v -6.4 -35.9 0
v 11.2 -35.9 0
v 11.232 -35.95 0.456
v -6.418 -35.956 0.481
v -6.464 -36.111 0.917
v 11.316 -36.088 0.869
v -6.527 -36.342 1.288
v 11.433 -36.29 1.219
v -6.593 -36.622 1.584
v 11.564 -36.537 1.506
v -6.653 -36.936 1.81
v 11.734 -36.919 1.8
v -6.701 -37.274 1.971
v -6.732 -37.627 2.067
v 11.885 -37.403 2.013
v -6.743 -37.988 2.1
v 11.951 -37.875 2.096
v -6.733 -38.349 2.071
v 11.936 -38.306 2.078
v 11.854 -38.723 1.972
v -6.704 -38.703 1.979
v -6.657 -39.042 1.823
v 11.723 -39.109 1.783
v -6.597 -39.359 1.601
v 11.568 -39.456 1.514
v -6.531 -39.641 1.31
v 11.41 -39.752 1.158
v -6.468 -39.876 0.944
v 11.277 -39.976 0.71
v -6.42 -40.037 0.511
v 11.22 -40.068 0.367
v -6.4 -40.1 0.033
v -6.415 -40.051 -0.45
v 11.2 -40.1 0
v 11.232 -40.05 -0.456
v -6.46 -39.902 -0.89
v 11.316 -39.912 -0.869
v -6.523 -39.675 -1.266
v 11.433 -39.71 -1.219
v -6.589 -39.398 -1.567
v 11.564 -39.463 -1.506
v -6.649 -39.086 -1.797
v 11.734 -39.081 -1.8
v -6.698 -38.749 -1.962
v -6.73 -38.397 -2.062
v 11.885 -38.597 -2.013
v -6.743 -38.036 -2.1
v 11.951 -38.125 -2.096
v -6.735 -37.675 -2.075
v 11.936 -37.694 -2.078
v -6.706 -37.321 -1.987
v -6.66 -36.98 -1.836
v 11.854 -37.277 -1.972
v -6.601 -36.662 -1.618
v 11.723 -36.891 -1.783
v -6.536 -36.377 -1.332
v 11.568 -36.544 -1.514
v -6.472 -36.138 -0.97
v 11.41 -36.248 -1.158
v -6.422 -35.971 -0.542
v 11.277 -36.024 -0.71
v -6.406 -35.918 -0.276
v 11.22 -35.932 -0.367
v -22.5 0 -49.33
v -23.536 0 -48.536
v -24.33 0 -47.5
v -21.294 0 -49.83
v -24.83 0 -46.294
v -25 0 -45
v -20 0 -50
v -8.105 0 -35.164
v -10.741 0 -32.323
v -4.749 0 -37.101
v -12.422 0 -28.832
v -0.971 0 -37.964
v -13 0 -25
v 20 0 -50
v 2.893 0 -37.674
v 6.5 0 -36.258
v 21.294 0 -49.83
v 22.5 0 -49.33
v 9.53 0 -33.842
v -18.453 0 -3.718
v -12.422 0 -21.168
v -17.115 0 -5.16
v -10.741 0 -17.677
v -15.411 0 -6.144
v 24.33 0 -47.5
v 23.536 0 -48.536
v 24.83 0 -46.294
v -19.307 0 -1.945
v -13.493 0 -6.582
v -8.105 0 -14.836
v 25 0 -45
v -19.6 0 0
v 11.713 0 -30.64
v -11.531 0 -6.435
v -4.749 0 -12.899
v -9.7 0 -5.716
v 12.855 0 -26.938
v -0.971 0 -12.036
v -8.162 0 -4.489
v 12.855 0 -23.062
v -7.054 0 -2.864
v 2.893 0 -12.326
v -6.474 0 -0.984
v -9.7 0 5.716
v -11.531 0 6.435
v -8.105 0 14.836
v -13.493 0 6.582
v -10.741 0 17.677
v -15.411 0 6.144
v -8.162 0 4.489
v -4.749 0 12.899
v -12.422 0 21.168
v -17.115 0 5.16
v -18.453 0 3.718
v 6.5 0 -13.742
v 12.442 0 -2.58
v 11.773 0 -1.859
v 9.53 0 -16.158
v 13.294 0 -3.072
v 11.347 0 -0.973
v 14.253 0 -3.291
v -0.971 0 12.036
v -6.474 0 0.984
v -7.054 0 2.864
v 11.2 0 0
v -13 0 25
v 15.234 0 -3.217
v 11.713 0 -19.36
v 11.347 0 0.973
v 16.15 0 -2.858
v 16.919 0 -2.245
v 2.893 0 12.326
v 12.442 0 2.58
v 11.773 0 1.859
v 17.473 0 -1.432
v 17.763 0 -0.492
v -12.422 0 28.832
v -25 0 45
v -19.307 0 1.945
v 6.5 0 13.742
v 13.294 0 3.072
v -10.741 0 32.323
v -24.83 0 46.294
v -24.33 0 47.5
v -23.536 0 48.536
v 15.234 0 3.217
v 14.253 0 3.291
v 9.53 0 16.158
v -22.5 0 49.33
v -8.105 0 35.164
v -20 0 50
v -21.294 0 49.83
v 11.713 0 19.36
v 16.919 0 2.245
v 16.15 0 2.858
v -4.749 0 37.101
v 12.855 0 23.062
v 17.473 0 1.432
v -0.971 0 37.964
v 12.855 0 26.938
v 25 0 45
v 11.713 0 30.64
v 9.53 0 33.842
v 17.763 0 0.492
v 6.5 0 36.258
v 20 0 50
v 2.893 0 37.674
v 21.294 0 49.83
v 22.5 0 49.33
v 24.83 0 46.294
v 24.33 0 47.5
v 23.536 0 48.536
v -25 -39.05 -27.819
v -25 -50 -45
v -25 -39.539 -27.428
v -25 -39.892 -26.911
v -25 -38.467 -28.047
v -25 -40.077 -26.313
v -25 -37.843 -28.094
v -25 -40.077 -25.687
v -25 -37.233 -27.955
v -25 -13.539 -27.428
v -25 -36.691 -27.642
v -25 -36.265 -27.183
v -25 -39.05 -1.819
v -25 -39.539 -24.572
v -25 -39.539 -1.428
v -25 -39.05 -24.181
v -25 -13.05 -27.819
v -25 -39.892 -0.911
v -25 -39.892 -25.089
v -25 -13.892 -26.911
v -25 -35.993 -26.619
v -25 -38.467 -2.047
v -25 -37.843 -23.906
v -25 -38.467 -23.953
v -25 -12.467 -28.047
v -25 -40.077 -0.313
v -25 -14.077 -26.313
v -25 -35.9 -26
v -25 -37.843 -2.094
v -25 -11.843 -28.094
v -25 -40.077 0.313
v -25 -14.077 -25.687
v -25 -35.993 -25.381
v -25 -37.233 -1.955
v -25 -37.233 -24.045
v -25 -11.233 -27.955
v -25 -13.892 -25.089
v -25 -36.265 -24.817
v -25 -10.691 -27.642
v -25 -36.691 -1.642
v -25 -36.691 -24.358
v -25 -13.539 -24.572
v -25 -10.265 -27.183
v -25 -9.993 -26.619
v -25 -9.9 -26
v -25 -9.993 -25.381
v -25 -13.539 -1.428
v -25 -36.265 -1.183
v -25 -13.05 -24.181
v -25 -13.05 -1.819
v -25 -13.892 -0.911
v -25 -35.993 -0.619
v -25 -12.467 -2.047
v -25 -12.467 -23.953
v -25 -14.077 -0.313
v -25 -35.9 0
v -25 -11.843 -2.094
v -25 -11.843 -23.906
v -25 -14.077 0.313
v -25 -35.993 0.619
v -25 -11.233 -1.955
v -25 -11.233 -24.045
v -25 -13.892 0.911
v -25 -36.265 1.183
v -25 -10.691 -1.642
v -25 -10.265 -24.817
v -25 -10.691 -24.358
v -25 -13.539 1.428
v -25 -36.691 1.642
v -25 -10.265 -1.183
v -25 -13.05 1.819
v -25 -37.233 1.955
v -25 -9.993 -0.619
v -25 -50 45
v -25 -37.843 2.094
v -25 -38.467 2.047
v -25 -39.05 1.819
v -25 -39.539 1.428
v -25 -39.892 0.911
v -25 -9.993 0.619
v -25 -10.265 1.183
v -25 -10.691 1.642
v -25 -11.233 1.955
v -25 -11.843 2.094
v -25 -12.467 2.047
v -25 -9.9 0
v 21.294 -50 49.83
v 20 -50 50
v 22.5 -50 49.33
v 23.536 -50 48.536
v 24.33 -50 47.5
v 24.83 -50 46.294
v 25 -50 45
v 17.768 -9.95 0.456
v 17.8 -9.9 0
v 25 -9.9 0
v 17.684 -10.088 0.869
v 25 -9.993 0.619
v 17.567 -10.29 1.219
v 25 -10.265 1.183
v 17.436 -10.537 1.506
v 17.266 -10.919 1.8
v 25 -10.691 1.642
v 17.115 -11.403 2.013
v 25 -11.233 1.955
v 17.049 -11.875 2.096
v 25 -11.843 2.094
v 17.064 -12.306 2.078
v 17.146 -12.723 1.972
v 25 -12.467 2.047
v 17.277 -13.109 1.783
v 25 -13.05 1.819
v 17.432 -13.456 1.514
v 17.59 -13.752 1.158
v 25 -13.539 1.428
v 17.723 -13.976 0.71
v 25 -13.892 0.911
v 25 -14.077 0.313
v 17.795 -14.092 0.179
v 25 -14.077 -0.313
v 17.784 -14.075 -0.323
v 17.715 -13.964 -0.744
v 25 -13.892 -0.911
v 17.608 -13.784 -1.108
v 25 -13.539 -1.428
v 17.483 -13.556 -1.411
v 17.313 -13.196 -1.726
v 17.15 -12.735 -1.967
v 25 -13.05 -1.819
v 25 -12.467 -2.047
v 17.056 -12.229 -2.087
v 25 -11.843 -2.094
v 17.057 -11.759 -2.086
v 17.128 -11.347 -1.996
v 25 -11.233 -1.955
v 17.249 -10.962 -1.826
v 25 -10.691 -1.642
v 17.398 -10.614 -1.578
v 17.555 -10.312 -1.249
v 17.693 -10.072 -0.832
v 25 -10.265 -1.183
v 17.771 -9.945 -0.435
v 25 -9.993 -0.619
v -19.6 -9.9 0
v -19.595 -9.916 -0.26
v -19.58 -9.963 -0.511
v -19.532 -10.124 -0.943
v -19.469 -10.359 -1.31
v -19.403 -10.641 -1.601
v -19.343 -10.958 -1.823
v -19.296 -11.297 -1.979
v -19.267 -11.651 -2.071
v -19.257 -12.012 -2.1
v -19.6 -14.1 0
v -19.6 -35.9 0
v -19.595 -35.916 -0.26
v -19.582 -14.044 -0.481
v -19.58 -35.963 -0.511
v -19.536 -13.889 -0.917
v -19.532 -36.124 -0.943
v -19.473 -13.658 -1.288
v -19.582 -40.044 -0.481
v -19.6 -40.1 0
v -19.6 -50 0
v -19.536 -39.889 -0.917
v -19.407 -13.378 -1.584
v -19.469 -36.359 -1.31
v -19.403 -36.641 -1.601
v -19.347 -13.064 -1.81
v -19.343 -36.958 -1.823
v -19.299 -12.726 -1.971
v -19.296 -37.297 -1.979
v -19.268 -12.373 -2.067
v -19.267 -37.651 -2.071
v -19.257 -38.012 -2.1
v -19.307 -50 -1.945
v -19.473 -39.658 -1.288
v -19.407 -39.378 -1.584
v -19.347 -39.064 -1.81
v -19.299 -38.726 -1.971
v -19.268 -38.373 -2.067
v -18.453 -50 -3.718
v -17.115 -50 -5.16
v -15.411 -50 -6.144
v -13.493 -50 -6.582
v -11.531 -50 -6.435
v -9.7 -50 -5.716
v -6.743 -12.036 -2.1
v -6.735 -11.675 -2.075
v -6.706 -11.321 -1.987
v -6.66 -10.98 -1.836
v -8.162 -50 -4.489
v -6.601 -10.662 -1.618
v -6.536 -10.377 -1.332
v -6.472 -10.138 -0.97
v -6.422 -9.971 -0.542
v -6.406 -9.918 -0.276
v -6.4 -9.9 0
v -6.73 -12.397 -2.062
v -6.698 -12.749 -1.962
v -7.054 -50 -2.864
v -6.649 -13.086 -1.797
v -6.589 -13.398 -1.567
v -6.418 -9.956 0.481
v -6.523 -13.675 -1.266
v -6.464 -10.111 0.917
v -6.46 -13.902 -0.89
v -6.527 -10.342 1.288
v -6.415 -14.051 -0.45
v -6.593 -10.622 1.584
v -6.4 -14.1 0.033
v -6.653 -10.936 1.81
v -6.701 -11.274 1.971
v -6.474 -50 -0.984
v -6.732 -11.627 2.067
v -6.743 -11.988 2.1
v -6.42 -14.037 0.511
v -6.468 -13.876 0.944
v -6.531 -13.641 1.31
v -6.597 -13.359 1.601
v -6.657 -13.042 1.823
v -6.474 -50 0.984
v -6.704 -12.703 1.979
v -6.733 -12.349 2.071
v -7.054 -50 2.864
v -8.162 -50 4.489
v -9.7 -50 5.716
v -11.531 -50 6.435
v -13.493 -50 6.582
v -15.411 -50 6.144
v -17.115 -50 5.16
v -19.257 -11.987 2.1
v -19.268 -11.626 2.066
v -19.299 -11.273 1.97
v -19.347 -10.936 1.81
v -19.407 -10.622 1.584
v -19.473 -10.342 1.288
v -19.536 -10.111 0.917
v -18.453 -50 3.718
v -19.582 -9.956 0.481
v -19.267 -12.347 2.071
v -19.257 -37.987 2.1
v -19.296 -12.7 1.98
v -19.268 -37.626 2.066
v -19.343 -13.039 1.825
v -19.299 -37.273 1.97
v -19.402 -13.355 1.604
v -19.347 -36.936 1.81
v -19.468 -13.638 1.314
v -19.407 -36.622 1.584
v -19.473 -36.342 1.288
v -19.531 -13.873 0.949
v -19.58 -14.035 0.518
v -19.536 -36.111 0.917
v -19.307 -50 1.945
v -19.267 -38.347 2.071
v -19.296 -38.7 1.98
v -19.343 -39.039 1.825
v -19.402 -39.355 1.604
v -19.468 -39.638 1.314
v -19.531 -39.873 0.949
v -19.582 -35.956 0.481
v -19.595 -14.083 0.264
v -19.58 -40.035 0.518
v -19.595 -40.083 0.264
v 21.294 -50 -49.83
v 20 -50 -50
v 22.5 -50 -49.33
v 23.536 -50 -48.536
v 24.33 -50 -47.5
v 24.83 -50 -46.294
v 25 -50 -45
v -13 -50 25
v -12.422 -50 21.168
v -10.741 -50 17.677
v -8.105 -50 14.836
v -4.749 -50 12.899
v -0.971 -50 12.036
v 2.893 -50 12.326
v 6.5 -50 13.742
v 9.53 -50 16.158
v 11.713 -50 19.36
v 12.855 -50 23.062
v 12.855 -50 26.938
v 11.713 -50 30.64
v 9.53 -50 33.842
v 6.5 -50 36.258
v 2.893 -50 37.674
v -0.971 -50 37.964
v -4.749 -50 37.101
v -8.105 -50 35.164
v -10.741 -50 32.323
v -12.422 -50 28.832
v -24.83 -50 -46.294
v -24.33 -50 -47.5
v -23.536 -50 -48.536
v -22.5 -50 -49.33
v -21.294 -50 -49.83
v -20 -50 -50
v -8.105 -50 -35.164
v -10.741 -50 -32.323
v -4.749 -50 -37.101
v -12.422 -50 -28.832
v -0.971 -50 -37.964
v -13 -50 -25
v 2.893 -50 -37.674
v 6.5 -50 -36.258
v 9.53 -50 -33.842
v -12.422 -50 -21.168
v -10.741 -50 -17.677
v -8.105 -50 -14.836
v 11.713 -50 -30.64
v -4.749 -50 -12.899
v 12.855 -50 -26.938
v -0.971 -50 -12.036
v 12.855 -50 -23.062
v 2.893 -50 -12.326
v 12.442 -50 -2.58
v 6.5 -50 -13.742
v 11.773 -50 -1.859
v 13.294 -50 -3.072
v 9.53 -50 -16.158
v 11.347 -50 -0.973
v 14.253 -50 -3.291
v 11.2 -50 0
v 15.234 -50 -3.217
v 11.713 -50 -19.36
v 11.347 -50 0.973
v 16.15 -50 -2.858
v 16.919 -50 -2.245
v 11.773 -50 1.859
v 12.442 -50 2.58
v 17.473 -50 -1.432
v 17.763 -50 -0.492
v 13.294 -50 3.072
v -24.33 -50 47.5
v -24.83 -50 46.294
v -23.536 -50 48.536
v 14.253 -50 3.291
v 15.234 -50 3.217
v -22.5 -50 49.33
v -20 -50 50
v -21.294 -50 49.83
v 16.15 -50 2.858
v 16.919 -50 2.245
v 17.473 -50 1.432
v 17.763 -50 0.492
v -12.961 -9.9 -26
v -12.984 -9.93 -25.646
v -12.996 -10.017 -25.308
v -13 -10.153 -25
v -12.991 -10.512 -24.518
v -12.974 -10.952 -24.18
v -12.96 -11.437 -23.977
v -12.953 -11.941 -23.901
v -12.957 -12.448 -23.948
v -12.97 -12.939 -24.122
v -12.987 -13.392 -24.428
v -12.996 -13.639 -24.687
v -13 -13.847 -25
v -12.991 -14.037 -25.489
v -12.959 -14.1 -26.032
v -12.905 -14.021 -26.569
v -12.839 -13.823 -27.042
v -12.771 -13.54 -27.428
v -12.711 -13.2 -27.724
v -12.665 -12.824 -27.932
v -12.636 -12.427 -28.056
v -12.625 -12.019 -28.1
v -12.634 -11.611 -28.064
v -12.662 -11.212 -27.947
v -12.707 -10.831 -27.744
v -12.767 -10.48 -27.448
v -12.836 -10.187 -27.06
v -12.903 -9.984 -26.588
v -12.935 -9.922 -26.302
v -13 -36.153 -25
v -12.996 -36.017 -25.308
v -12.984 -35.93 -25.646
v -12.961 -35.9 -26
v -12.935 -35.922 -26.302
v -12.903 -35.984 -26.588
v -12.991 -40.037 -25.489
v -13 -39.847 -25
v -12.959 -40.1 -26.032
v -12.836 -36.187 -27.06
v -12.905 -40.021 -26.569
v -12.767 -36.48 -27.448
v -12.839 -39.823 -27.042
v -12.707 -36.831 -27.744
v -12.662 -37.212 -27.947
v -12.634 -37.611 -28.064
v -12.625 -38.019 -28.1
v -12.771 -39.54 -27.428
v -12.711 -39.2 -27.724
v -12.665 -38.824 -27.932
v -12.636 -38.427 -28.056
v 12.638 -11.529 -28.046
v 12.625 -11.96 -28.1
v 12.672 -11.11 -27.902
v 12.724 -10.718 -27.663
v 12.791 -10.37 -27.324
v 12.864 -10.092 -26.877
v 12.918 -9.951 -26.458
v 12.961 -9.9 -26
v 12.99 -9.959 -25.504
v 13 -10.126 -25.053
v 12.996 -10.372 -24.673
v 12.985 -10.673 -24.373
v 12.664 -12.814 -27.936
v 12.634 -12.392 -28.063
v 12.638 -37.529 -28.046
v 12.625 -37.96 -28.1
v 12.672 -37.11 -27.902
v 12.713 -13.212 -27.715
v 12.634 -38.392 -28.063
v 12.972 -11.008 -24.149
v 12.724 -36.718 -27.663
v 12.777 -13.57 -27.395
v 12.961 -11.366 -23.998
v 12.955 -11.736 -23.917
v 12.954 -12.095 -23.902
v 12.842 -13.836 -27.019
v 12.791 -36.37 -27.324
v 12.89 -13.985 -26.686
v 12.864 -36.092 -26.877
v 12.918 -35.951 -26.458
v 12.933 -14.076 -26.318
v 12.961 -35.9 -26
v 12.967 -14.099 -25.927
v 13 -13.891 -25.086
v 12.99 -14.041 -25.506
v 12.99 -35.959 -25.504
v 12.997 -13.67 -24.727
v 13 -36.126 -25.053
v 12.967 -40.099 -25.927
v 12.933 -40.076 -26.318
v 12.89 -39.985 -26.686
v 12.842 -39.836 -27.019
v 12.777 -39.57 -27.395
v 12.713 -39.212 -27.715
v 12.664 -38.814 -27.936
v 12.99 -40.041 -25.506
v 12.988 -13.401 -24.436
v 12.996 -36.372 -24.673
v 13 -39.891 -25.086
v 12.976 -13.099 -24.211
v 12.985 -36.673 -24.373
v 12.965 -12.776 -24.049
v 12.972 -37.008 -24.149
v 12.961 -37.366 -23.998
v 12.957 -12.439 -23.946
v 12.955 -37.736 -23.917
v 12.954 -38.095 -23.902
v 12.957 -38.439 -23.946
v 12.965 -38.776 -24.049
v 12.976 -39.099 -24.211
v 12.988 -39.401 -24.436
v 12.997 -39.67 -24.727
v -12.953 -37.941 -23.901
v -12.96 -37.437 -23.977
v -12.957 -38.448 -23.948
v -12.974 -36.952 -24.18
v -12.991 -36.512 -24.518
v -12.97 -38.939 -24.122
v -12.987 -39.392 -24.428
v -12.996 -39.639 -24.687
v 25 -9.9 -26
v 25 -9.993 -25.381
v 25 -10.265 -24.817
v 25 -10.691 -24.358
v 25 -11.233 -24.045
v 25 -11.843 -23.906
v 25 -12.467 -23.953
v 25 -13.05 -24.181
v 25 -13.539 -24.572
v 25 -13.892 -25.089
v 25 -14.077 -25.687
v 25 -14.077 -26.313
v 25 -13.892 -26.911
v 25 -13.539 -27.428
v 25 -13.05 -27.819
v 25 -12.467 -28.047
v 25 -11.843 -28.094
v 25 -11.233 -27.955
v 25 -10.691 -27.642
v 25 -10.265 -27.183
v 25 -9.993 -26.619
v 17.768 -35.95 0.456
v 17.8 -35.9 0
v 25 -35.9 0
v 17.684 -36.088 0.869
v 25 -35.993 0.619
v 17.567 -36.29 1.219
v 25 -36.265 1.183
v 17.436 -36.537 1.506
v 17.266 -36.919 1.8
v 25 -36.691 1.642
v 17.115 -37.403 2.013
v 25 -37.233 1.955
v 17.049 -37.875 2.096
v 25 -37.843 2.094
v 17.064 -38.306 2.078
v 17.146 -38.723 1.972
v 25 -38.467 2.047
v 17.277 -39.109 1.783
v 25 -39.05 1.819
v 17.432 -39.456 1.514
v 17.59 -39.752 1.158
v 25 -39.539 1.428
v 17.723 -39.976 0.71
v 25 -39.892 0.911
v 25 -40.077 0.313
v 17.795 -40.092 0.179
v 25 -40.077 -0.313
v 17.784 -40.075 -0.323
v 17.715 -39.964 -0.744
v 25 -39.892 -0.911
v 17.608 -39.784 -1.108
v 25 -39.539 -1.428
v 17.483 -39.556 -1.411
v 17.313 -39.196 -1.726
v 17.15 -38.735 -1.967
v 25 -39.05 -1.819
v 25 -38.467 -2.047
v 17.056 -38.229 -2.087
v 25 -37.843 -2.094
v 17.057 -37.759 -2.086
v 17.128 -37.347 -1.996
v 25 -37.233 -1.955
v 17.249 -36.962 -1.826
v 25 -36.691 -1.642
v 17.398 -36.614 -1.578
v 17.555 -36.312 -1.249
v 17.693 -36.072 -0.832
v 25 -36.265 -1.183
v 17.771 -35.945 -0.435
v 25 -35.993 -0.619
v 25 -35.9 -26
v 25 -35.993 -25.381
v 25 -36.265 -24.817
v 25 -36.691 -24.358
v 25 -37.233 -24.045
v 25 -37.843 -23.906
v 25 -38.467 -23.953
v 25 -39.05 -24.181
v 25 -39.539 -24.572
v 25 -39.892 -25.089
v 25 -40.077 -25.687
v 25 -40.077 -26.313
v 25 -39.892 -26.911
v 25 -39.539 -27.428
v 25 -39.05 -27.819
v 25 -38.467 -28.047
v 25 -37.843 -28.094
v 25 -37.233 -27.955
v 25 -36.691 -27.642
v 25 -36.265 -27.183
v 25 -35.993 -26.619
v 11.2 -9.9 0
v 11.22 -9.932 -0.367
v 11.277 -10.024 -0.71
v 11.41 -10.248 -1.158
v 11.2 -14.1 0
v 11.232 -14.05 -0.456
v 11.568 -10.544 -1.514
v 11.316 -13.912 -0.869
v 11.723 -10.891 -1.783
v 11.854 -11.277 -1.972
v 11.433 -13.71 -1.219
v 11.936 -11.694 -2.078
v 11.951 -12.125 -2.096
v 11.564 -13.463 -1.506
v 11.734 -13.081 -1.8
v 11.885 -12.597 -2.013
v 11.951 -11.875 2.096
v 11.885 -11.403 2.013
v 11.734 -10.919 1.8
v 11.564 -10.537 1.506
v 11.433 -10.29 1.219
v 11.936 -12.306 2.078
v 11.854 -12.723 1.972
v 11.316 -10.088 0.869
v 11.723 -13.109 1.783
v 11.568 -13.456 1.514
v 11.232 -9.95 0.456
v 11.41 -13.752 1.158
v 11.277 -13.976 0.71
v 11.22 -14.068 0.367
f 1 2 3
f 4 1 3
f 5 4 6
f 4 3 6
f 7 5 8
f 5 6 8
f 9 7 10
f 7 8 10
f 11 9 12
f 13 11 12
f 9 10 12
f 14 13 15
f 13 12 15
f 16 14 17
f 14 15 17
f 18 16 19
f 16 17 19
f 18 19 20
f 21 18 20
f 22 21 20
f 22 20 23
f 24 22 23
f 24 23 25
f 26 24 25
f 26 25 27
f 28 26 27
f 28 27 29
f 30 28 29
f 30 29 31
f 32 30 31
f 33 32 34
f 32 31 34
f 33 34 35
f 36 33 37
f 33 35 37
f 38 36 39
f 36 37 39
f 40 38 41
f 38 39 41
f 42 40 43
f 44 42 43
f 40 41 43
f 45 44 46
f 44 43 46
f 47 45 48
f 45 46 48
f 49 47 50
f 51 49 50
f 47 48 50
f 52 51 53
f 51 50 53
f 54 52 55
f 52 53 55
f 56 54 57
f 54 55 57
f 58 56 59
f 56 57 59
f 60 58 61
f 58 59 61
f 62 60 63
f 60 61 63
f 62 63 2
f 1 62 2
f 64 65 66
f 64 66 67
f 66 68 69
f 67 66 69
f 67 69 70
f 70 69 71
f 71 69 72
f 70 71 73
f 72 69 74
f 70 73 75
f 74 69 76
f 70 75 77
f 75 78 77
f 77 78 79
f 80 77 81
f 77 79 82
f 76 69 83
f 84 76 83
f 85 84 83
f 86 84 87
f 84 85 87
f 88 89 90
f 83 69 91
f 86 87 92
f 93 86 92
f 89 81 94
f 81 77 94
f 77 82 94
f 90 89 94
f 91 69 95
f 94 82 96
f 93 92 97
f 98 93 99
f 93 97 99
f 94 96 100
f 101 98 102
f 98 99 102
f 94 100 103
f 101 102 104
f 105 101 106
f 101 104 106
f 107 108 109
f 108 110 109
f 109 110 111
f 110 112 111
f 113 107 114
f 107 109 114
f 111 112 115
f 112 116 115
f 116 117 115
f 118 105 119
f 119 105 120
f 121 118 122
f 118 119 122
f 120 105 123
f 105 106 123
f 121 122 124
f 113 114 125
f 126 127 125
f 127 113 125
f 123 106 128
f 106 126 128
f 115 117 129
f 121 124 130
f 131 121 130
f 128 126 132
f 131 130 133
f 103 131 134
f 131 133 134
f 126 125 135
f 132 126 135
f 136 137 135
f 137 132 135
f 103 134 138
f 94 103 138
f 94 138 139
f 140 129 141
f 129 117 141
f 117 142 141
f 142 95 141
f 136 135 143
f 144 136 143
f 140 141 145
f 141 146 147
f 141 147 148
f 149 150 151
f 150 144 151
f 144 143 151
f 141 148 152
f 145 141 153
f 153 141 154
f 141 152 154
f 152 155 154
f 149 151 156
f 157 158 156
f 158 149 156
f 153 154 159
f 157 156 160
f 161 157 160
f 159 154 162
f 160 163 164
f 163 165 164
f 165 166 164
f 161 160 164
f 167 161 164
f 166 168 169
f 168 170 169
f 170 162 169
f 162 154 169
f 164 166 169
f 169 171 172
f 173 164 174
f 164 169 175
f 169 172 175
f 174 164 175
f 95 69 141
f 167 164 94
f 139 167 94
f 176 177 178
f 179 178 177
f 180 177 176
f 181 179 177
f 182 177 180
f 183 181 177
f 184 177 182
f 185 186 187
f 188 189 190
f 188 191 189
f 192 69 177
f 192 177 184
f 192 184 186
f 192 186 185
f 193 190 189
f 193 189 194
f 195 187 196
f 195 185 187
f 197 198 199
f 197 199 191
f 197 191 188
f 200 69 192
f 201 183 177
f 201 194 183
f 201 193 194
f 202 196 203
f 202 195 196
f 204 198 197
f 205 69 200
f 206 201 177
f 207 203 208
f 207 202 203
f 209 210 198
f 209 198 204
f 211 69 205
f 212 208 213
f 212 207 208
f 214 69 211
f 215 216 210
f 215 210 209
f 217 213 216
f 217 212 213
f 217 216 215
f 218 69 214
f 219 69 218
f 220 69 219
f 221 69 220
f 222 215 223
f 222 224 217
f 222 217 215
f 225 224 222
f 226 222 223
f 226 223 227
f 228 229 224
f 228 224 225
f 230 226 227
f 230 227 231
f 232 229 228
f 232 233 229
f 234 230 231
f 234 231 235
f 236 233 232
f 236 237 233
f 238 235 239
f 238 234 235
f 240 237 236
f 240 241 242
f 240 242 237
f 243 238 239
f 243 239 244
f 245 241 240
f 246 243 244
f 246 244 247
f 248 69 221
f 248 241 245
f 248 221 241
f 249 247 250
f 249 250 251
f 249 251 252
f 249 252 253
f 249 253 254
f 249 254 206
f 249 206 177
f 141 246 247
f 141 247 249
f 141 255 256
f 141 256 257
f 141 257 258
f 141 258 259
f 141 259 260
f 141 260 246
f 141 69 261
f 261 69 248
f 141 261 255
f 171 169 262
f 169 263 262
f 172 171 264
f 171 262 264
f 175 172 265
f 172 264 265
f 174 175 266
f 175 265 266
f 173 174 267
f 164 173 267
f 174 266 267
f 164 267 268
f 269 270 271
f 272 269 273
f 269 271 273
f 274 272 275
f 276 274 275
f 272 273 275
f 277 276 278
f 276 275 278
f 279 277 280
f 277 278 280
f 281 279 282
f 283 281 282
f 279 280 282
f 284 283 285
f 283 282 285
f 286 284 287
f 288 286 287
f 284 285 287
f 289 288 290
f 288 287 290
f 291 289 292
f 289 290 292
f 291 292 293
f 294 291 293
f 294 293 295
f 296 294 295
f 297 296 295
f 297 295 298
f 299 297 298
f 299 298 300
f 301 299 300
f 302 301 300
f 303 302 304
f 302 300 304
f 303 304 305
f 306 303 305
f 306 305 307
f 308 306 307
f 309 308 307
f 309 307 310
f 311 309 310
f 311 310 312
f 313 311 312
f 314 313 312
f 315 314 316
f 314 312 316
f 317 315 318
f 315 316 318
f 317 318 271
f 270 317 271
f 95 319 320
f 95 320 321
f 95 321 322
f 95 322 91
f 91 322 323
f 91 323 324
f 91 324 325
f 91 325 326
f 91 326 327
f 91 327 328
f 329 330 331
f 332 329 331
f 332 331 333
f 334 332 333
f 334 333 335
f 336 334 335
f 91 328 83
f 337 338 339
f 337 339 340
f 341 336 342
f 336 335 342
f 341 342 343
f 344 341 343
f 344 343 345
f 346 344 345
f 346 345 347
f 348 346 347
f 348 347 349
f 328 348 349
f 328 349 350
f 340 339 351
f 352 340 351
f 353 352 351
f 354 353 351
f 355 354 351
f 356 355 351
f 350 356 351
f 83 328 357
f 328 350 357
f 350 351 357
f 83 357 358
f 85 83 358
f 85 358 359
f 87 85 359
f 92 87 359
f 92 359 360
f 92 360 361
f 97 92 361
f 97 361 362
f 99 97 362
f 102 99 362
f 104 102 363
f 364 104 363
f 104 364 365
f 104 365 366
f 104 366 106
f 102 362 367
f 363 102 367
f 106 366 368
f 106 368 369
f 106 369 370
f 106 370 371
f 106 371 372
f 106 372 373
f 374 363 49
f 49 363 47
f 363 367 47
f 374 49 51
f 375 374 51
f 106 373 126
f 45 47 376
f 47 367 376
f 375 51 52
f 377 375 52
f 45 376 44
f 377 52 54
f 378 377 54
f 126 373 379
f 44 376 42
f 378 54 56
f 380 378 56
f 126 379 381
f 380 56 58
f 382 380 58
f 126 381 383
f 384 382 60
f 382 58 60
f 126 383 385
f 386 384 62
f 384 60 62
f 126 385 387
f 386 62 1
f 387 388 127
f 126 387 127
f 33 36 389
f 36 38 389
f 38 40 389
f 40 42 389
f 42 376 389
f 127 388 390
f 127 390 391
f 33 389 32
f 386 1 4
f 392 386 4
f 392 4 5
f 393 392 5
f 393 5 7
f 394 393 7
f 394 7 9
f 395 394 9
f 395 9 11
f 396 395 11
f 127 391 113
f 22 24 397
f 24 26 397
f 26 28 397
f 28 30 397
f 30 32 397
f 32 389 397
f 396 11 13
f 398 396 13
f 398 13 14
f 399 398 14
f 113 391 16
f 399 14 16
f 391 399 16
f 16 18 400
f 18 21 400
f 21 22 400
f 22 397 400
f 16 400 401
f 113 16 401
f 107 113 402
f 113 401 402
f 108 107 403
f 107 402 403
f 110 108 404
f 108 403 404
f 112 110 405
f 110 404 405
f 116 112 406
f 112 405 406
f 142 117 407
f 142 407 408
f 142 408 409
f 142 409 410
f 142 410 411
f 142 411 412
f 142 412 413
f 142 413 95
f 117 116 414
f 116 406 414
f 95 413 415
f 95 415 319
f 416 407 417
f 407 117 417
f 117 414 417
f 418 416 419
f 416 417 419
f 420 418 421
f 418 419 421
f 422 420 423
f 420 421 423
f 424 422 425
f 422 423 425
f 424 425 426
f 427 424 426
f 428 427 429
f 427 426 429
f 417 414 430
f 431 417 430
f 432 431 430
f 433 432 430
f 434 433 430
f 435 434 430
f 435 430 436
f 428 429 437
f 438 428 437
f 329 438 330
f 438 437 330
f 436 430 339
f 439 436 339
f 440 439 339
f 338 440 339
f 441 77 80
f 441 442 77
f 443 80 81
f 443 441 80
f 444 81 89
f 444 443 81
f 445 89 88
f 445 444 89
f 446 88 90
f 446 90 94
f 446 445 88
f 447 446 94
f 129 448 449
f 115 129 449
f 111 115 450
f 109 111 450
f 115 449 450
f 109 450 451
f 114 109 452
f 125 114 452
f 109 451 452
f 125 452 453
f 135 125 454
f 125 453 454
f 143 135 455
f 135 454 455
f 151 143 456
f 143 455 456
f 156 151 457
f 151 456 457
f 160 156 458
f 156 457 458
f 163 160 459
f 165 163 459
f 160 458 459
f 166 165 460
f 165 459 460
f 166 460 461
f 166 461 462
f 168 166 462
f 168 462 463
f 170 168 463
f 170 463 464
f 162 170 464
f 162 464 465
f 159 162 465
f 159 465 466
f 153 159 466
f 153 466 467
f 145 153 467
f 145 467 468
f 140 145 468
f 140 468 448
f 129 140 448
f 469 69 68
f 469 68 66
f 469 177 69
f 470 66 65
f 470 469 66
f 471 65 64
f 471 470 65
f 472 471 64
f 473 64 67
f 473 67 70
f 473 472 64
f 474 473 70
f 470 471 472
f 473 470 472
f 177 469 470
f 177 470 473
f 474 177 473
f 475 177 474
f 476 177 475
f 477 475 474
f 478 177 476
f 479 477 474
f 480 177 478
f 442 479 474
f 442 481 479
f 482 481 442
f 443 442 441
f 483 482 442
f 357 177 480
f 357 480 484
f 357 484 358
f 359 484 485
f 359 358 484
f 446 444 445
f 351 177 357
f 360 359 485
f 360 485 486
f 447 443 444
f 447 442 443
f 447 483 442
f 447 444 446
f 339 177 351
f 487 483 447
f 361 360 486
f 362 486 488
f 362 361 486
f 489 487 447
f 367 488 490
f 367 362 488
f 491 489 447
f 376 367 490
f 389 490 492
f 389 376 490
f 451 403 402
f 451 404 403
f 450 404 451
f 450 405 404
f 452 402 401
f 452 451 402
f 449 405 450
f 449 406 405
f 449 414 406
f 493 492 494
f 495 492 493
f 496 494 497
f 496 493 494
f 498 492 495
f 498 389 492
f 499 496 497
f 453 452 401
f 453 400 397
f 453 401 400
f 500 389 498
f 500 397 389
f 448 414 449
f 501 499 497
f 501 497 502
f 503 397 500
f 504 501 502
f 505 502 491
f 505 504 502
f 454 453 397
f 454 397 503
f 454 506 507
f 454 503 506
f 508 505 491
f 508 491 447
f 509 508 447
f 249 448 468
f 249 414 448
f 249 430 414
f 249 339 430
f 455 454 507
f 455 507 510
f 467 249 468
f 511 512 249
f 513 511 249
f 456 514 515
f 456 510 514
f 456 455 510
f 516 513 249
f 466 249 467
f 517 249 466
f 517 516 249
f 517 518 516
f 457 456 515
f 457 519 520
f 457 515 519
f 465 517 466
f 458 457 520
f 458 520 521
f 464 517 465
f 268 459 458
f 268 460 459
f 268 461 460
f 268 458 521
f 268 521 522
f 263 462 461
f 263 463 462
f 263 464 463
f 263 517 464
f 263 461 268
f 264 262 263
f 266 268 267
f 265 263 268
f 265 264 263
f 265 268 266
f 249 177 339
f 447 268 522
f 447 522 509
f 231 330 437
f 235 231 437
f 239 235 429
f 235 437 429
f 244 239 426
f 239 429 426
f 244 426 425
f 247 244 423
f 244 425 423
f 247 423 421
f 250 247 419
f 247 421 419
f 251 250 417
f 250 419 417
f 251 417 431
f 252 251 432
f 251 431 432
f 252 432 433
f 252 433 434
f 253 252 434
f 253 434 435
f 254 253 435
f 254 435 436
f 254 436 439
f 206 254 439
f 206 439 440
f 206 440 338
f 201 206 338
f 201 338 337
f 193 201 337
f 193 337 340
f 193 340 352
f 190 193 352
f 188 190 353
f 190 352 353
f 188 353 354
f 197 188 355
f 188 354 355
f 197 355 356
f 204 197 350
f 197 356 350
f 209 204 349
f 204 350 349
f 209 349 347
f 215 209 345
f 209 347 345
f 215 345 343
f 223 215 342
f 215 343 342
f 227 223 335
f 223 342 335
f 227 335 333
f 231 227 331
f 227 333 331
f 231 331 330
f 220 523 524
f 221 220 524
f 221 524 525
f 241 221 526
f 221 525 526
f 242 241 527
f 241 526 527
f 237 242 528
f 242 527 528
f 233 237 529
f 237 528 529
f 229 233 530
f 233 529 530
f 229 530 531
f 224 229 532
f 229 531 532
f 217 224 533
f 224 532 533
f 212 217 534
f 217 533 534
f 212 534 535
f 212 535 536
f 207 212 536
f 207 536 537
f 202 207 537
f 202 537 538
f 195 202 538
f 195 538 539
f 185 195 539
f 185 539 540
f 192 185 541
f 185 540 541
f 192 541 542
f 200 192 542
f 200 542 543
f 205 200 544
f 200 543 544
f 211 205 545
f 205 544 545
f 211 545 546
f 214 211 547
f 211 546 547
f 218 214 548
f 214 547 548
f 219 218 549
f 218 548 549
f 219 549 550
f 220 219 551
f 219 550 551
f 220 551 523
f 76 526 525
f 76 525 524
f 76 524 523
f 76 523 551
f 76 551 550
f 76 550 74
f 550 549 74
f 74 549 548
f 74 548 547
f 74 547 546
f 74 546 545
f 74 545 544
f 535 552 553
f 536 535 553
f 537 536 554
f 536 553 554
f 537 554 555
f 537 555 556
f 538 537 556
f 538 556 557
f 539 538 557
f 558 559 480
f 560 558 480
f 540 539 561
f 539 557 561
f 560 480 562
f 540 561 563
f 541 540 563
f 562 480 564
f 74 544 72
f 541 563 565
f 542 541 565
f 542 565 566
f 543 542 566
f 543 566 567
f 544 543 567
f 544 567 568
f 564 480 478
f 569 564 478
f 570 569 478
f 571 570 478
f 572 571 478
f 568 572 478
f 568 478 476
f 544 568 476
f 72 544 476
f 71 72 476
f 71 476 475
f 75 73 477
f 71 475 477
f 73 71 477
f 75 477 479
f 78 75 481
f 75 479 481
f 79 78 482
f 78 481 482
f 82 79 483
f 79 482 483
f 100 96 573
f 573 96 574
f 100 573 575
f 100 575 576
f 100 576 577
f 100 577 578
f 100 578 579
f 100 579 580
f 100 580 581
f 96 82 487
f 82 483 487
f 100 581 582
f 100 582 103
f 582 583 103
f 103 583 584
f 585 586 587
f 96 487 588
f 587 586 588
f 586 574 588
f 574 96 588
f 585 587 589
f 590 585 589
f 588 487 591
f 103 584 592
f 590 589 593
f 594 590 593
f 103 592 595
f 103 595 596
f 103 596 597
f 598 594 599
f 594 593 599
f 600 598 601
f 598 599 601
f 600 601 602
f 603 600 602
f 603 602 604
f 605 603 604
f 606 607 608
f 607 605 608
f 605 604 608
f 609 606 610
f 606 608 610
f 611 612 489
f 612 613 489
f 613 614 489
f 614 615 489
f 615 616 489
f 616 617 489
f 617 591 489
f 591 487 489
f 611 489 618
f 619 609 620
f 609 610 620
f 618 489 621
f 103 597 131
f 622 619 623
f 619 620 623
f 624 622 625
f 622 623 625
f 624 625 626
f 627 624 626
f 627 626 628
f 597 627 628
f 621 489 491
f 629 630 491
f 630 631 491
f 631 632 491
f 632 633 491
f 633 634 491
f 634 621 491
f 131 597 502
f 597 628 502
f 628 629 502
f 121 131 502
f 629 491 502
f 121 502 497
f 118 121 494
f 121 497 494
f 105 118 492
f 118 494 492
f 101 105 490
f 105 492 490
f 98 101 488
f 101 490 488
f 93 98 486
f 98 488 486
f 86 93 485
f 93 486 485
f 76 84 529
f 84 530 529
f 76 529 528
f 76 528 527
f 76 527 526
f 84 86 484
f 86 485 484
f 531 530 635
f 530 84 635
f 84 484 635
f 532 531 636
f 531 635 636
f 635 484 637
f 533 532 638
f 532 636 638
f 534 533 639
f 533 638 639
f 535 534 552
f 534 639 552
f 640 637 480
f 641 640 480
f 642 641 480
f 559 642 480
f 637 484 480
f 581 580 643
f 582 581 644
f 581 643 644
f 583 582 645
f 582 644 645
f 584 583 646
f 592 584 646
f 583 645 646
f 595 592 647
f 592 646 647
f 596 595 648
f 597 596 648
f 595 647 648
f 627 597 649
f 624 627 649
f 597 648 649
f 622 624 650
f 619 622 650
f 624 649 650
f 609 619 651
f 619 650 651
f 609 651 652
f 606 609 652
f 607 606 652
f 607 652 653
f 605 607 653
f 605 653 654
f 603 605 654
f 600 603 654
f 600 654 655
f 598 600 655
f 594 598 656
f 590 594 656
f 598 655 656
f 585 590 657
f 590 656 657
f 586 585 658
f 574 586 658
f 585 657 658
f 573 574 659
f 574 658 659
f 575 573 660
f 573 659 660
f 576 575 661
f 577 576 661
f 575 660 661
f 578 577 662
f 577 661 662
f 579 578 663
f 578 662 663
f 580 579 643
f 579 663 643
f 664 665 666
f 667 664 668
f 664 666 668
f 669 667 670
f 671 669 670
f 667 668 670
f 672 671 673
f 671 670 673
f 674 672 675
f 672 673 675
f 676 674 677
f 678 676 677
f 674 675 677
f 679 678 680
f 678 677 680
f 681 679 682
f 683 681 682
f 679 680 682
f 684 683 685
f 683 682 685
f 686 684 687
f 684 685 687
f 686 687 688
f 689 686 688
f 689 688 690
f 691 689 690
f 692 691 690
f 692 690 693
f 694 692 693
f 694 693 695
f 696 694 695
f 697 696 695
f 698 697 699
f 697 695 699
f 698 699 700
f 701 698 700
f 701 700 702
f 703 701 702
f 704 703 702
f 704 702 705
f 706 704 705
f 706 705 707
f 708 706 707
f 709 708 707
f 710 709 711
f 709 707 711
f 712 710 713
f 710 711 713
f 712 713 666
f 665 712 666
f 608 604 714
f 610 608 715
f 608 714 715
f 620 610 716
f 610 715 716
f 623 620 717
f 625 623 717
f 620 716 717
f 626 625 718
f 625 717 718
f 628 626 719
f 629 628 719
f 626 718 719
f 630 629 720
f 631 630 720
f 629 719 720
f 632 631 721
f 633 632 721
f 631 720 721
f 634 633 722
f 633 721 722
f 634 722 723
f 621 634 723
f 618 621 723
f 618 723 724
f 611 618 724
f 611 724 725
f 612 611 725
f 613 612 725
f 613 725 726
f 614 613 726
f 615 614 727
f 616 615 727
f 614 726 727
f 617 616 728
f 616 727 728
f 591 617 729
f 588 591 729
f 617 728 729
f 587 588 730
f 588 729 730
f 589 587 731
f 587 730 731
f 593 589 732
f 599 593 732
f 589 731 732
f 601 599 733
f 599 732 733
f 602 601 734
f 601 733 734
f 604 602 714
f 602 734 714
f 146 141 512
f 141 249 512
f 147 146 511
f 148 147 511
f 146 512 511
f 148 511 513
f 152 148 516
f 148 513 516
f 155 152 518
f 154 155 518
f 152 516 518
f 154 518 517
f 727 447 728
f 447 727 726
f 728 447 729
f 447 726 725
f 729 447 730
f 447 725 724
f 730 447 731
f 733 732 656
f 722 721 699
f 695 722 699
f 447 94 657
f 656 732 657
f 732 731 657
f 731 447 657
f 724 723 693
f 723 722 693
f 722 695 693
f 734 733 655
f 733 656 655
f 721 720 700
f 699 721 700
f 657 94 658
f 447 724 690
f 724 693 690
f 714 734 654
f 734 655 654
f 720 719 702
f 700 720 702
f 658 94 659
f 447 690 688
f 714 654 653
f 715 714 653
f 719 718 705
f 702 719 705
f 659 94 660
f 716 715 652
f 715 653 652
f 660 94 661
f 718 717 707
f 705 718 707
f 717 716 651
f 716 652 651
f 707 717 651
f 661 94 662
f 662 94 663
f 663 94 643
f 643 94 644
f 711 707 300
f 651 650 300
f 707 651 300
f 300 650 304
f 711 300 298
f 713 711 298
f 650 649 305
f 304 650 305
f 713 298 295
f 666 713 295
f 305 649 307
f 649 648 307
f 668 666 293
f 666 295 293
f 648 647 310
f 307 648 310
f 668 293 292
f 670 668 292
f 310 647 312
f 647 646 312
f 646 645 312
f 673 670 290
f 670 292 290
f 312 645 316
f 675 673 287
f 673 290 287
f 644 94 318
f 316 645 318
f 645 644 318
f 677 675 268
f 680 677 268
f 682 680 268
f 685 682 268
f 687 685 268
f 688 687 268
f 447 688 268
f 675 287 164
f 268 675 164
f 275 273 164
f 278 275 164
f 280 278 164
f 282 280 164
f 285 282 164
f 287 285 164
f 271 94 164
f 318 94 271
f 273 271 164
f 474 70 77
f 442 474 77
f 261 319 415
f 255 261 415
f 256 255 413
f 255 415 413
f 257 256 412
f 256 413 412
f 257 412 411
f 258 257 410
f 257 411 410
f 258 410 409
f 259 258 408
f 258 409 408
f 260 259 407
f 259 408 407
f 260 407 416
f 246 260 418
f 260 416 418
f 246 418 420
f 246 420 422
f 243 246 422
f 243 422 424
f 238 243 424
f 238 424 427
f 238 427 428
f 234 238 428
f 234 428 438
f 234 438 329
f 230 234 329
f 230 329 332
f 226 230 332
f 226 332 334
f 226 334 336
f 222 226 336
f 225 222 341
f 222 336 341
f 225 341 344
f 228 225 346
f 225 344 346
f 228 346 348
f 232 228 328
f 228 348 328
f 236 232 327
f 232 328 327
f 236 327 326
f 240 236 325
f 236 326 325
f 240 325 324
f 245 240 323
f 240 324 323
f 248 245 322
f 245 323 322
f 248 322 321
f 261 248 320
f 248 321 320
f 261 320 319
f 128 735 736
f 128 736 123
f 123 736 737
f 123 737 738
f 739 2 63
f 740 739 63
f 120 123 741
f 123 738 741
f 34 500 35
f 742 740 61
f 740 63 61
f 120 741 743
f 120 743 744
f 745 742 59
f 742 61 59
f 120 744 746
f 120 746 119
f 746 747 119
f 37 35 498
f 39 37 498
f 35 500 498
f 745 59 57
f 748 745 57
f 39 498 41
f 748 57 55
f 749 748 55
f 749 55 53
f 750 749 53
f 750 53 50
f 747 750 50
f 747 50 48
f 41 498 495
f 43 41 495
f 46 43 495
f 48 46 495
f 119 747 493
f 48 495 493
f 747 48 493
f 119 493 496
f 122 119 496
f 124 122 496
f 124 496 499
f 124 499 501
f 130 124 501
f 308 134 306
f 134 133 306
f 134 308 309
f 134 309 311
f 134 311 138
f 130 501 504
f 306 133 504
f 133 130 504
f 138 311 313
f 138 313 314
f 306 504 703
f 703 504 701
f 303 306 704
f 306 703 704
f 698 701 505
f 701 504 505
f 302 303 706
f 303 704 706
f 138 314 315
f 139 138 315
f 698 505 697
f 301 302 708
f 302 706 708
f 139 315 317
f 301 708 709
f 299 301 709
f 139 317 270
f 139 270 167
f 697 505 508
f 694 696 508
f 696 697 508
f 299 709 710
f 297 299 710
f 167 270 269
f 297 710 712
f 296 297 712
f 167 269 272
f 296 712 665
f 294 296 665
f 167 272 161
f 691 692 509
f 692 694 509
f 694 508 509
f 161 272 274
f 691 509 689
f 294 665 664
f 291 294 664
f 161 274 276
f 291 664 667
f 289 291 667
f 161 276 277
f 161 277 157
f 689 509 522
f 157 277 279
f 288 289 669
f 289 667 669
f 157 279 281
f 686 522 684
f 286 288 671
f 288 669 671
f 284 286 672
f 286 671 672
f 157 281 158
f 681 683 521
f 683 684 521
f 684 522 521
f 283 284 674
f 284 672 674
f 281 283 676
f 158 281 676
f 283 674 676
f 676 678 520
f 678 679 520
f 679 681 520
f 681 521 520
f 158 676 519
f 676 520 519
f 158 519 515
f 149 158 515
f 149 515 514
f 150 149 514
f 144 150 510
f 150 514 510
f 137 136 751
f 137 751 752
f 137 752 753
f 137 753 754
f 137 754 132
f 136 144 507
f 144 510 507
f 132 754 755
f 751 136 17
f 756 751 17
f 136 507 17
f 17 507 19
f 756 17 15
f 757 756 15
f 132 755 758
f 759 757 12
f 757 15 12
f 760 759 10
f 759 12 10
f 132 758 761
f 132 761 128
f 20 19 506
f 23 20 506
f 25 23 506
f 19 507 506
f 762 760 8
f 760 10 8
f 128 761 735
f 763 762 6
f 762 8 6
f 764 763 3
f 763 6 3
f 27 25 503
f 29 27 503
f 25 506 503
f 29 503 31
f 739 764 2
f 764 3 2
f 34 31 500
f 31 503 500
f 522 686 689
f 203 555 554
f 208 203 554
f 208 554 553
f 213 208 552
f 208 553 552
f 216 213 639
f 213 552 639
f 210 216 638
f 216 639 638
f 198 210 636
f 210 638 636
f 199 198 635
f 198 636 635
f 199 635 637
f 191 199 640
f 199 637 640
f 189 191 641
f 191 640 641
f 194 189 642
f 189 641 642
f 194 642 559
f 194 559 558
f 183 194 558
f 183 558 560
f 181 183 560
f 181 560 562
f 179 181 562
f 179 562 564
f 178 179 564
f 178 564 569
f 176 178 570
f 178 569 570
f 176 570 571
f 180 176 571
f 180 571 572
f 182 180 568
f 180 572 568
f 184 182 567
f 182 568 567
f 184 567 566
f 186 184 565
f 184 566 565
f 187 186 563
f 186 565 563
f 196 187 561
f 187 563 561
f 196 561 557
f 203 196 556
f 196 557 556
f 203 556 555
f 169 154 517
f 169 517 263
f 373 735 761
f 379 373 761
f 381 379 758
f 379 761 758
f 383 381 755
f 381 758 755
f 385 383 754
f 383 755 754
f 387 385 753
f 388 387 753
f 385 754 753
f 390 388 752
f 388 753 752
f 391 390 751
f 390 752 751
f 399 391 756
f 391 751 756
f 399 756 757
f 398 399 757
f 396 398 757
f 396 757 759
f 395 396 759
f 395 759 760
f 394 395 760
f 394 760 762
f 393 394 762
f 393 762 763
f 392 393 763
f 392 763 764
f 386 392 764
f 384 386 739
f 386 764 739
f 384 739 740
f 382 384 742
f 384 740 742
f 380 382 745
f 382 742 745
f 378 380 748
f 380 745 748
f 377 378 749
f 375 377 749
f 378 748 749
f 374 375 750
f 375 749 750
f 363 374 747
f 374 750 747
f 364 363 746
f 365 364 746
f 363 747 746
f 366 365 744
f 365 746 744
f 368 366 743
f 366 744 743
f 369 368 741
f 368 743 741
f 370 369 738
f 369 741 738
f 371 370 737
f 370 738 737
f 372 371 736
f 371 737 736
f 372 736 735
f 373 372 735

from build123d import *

# Parameters (mm, degrees)
F0_W     = 50
F0_H     = 100
F1_DEPTH = 50
F2_D     = 26
F3_D     = 6.6
F4_D     = 13.2
F5_R     = 5
F7_D     = 4.2
F7_DEPTH = 52.4
F7_TIP   = 1.2618073
F8_D     = 4.2
F8_DEPTH = 50
F8_TIP   = 1.2618073


with BuildPart() as f1:
    # F0 (on Front) → F1 (new body)
    with BuildSketch(Plane.XZ):
        Rectangle(F0_W, F0_H)
    extrude(amount=F1_DEPTH)

    # F2 (through all)
    with Locations(Plane(origin=(0, 0, 0), x_dir=(1, 0, 0), z_dir=(0, 1, 0))):
        with Locations((0, -25), (0, 25)):
            Hole(F2_D / 2)

    # F3 (through all)
    with Locations(Plane(origin=(0, 0, 0), x_dir=(1, 0, 0), z_dir=(0, 1, 0))):
        with Locations((14.5, 0)):
            Hole(F3_D / 2)

    # F4 (through all)
    with Locations(Plane(origin=(0, 0, 0), x_dir=(1, 0, 0), z_dir=(0, 1, 0))):
        with Locations((-13, 0)):
            Hole(F4_D / 2)

    # F5
    f5_edges = [f1.edges().sort_by_distance(p)[0] for p in [
        (-25, -25, 50),
        (25, -25, 50),
        (25, -25, -50),
        (-25, -25, -50),
    ]]
    fillet(f5_edges, radius=F5_R)

    # F7
    with Locations(Plane(origin=(-25, 0, 0), x_dir=(0, -1, 0), z_dir=(-1, 0, 0))):
        with Locations((12, 0), (38, 0)):
            Hole(F7_D / 2, depth=F7_DEPTH)
            with Locations((0, 0, -(F7_DEPTH + F7_TIP / 2))):  # 118° drill point
                Cone(0, F7_D / 2, F7_TIP, mode=Mode.SUBTRACT)

    # F8
    with Locations(Plane(origin=(-25, 0, 0), x_dir=(0, -1, 0), z_dir=(-1, 0, 0))):
        with Locations((12, -26), (38, -26)):
            Hole(F8_D / 2, depth=F8_DEPTH)
            with Locations((0, 0, -(F8_DEPTH + F8_TIP / 2))):  # 118° drill point
                Cone(0, F8_D / 2, F8_TIP, mode=Mode.SUBTRACT)


solid = f1.part
